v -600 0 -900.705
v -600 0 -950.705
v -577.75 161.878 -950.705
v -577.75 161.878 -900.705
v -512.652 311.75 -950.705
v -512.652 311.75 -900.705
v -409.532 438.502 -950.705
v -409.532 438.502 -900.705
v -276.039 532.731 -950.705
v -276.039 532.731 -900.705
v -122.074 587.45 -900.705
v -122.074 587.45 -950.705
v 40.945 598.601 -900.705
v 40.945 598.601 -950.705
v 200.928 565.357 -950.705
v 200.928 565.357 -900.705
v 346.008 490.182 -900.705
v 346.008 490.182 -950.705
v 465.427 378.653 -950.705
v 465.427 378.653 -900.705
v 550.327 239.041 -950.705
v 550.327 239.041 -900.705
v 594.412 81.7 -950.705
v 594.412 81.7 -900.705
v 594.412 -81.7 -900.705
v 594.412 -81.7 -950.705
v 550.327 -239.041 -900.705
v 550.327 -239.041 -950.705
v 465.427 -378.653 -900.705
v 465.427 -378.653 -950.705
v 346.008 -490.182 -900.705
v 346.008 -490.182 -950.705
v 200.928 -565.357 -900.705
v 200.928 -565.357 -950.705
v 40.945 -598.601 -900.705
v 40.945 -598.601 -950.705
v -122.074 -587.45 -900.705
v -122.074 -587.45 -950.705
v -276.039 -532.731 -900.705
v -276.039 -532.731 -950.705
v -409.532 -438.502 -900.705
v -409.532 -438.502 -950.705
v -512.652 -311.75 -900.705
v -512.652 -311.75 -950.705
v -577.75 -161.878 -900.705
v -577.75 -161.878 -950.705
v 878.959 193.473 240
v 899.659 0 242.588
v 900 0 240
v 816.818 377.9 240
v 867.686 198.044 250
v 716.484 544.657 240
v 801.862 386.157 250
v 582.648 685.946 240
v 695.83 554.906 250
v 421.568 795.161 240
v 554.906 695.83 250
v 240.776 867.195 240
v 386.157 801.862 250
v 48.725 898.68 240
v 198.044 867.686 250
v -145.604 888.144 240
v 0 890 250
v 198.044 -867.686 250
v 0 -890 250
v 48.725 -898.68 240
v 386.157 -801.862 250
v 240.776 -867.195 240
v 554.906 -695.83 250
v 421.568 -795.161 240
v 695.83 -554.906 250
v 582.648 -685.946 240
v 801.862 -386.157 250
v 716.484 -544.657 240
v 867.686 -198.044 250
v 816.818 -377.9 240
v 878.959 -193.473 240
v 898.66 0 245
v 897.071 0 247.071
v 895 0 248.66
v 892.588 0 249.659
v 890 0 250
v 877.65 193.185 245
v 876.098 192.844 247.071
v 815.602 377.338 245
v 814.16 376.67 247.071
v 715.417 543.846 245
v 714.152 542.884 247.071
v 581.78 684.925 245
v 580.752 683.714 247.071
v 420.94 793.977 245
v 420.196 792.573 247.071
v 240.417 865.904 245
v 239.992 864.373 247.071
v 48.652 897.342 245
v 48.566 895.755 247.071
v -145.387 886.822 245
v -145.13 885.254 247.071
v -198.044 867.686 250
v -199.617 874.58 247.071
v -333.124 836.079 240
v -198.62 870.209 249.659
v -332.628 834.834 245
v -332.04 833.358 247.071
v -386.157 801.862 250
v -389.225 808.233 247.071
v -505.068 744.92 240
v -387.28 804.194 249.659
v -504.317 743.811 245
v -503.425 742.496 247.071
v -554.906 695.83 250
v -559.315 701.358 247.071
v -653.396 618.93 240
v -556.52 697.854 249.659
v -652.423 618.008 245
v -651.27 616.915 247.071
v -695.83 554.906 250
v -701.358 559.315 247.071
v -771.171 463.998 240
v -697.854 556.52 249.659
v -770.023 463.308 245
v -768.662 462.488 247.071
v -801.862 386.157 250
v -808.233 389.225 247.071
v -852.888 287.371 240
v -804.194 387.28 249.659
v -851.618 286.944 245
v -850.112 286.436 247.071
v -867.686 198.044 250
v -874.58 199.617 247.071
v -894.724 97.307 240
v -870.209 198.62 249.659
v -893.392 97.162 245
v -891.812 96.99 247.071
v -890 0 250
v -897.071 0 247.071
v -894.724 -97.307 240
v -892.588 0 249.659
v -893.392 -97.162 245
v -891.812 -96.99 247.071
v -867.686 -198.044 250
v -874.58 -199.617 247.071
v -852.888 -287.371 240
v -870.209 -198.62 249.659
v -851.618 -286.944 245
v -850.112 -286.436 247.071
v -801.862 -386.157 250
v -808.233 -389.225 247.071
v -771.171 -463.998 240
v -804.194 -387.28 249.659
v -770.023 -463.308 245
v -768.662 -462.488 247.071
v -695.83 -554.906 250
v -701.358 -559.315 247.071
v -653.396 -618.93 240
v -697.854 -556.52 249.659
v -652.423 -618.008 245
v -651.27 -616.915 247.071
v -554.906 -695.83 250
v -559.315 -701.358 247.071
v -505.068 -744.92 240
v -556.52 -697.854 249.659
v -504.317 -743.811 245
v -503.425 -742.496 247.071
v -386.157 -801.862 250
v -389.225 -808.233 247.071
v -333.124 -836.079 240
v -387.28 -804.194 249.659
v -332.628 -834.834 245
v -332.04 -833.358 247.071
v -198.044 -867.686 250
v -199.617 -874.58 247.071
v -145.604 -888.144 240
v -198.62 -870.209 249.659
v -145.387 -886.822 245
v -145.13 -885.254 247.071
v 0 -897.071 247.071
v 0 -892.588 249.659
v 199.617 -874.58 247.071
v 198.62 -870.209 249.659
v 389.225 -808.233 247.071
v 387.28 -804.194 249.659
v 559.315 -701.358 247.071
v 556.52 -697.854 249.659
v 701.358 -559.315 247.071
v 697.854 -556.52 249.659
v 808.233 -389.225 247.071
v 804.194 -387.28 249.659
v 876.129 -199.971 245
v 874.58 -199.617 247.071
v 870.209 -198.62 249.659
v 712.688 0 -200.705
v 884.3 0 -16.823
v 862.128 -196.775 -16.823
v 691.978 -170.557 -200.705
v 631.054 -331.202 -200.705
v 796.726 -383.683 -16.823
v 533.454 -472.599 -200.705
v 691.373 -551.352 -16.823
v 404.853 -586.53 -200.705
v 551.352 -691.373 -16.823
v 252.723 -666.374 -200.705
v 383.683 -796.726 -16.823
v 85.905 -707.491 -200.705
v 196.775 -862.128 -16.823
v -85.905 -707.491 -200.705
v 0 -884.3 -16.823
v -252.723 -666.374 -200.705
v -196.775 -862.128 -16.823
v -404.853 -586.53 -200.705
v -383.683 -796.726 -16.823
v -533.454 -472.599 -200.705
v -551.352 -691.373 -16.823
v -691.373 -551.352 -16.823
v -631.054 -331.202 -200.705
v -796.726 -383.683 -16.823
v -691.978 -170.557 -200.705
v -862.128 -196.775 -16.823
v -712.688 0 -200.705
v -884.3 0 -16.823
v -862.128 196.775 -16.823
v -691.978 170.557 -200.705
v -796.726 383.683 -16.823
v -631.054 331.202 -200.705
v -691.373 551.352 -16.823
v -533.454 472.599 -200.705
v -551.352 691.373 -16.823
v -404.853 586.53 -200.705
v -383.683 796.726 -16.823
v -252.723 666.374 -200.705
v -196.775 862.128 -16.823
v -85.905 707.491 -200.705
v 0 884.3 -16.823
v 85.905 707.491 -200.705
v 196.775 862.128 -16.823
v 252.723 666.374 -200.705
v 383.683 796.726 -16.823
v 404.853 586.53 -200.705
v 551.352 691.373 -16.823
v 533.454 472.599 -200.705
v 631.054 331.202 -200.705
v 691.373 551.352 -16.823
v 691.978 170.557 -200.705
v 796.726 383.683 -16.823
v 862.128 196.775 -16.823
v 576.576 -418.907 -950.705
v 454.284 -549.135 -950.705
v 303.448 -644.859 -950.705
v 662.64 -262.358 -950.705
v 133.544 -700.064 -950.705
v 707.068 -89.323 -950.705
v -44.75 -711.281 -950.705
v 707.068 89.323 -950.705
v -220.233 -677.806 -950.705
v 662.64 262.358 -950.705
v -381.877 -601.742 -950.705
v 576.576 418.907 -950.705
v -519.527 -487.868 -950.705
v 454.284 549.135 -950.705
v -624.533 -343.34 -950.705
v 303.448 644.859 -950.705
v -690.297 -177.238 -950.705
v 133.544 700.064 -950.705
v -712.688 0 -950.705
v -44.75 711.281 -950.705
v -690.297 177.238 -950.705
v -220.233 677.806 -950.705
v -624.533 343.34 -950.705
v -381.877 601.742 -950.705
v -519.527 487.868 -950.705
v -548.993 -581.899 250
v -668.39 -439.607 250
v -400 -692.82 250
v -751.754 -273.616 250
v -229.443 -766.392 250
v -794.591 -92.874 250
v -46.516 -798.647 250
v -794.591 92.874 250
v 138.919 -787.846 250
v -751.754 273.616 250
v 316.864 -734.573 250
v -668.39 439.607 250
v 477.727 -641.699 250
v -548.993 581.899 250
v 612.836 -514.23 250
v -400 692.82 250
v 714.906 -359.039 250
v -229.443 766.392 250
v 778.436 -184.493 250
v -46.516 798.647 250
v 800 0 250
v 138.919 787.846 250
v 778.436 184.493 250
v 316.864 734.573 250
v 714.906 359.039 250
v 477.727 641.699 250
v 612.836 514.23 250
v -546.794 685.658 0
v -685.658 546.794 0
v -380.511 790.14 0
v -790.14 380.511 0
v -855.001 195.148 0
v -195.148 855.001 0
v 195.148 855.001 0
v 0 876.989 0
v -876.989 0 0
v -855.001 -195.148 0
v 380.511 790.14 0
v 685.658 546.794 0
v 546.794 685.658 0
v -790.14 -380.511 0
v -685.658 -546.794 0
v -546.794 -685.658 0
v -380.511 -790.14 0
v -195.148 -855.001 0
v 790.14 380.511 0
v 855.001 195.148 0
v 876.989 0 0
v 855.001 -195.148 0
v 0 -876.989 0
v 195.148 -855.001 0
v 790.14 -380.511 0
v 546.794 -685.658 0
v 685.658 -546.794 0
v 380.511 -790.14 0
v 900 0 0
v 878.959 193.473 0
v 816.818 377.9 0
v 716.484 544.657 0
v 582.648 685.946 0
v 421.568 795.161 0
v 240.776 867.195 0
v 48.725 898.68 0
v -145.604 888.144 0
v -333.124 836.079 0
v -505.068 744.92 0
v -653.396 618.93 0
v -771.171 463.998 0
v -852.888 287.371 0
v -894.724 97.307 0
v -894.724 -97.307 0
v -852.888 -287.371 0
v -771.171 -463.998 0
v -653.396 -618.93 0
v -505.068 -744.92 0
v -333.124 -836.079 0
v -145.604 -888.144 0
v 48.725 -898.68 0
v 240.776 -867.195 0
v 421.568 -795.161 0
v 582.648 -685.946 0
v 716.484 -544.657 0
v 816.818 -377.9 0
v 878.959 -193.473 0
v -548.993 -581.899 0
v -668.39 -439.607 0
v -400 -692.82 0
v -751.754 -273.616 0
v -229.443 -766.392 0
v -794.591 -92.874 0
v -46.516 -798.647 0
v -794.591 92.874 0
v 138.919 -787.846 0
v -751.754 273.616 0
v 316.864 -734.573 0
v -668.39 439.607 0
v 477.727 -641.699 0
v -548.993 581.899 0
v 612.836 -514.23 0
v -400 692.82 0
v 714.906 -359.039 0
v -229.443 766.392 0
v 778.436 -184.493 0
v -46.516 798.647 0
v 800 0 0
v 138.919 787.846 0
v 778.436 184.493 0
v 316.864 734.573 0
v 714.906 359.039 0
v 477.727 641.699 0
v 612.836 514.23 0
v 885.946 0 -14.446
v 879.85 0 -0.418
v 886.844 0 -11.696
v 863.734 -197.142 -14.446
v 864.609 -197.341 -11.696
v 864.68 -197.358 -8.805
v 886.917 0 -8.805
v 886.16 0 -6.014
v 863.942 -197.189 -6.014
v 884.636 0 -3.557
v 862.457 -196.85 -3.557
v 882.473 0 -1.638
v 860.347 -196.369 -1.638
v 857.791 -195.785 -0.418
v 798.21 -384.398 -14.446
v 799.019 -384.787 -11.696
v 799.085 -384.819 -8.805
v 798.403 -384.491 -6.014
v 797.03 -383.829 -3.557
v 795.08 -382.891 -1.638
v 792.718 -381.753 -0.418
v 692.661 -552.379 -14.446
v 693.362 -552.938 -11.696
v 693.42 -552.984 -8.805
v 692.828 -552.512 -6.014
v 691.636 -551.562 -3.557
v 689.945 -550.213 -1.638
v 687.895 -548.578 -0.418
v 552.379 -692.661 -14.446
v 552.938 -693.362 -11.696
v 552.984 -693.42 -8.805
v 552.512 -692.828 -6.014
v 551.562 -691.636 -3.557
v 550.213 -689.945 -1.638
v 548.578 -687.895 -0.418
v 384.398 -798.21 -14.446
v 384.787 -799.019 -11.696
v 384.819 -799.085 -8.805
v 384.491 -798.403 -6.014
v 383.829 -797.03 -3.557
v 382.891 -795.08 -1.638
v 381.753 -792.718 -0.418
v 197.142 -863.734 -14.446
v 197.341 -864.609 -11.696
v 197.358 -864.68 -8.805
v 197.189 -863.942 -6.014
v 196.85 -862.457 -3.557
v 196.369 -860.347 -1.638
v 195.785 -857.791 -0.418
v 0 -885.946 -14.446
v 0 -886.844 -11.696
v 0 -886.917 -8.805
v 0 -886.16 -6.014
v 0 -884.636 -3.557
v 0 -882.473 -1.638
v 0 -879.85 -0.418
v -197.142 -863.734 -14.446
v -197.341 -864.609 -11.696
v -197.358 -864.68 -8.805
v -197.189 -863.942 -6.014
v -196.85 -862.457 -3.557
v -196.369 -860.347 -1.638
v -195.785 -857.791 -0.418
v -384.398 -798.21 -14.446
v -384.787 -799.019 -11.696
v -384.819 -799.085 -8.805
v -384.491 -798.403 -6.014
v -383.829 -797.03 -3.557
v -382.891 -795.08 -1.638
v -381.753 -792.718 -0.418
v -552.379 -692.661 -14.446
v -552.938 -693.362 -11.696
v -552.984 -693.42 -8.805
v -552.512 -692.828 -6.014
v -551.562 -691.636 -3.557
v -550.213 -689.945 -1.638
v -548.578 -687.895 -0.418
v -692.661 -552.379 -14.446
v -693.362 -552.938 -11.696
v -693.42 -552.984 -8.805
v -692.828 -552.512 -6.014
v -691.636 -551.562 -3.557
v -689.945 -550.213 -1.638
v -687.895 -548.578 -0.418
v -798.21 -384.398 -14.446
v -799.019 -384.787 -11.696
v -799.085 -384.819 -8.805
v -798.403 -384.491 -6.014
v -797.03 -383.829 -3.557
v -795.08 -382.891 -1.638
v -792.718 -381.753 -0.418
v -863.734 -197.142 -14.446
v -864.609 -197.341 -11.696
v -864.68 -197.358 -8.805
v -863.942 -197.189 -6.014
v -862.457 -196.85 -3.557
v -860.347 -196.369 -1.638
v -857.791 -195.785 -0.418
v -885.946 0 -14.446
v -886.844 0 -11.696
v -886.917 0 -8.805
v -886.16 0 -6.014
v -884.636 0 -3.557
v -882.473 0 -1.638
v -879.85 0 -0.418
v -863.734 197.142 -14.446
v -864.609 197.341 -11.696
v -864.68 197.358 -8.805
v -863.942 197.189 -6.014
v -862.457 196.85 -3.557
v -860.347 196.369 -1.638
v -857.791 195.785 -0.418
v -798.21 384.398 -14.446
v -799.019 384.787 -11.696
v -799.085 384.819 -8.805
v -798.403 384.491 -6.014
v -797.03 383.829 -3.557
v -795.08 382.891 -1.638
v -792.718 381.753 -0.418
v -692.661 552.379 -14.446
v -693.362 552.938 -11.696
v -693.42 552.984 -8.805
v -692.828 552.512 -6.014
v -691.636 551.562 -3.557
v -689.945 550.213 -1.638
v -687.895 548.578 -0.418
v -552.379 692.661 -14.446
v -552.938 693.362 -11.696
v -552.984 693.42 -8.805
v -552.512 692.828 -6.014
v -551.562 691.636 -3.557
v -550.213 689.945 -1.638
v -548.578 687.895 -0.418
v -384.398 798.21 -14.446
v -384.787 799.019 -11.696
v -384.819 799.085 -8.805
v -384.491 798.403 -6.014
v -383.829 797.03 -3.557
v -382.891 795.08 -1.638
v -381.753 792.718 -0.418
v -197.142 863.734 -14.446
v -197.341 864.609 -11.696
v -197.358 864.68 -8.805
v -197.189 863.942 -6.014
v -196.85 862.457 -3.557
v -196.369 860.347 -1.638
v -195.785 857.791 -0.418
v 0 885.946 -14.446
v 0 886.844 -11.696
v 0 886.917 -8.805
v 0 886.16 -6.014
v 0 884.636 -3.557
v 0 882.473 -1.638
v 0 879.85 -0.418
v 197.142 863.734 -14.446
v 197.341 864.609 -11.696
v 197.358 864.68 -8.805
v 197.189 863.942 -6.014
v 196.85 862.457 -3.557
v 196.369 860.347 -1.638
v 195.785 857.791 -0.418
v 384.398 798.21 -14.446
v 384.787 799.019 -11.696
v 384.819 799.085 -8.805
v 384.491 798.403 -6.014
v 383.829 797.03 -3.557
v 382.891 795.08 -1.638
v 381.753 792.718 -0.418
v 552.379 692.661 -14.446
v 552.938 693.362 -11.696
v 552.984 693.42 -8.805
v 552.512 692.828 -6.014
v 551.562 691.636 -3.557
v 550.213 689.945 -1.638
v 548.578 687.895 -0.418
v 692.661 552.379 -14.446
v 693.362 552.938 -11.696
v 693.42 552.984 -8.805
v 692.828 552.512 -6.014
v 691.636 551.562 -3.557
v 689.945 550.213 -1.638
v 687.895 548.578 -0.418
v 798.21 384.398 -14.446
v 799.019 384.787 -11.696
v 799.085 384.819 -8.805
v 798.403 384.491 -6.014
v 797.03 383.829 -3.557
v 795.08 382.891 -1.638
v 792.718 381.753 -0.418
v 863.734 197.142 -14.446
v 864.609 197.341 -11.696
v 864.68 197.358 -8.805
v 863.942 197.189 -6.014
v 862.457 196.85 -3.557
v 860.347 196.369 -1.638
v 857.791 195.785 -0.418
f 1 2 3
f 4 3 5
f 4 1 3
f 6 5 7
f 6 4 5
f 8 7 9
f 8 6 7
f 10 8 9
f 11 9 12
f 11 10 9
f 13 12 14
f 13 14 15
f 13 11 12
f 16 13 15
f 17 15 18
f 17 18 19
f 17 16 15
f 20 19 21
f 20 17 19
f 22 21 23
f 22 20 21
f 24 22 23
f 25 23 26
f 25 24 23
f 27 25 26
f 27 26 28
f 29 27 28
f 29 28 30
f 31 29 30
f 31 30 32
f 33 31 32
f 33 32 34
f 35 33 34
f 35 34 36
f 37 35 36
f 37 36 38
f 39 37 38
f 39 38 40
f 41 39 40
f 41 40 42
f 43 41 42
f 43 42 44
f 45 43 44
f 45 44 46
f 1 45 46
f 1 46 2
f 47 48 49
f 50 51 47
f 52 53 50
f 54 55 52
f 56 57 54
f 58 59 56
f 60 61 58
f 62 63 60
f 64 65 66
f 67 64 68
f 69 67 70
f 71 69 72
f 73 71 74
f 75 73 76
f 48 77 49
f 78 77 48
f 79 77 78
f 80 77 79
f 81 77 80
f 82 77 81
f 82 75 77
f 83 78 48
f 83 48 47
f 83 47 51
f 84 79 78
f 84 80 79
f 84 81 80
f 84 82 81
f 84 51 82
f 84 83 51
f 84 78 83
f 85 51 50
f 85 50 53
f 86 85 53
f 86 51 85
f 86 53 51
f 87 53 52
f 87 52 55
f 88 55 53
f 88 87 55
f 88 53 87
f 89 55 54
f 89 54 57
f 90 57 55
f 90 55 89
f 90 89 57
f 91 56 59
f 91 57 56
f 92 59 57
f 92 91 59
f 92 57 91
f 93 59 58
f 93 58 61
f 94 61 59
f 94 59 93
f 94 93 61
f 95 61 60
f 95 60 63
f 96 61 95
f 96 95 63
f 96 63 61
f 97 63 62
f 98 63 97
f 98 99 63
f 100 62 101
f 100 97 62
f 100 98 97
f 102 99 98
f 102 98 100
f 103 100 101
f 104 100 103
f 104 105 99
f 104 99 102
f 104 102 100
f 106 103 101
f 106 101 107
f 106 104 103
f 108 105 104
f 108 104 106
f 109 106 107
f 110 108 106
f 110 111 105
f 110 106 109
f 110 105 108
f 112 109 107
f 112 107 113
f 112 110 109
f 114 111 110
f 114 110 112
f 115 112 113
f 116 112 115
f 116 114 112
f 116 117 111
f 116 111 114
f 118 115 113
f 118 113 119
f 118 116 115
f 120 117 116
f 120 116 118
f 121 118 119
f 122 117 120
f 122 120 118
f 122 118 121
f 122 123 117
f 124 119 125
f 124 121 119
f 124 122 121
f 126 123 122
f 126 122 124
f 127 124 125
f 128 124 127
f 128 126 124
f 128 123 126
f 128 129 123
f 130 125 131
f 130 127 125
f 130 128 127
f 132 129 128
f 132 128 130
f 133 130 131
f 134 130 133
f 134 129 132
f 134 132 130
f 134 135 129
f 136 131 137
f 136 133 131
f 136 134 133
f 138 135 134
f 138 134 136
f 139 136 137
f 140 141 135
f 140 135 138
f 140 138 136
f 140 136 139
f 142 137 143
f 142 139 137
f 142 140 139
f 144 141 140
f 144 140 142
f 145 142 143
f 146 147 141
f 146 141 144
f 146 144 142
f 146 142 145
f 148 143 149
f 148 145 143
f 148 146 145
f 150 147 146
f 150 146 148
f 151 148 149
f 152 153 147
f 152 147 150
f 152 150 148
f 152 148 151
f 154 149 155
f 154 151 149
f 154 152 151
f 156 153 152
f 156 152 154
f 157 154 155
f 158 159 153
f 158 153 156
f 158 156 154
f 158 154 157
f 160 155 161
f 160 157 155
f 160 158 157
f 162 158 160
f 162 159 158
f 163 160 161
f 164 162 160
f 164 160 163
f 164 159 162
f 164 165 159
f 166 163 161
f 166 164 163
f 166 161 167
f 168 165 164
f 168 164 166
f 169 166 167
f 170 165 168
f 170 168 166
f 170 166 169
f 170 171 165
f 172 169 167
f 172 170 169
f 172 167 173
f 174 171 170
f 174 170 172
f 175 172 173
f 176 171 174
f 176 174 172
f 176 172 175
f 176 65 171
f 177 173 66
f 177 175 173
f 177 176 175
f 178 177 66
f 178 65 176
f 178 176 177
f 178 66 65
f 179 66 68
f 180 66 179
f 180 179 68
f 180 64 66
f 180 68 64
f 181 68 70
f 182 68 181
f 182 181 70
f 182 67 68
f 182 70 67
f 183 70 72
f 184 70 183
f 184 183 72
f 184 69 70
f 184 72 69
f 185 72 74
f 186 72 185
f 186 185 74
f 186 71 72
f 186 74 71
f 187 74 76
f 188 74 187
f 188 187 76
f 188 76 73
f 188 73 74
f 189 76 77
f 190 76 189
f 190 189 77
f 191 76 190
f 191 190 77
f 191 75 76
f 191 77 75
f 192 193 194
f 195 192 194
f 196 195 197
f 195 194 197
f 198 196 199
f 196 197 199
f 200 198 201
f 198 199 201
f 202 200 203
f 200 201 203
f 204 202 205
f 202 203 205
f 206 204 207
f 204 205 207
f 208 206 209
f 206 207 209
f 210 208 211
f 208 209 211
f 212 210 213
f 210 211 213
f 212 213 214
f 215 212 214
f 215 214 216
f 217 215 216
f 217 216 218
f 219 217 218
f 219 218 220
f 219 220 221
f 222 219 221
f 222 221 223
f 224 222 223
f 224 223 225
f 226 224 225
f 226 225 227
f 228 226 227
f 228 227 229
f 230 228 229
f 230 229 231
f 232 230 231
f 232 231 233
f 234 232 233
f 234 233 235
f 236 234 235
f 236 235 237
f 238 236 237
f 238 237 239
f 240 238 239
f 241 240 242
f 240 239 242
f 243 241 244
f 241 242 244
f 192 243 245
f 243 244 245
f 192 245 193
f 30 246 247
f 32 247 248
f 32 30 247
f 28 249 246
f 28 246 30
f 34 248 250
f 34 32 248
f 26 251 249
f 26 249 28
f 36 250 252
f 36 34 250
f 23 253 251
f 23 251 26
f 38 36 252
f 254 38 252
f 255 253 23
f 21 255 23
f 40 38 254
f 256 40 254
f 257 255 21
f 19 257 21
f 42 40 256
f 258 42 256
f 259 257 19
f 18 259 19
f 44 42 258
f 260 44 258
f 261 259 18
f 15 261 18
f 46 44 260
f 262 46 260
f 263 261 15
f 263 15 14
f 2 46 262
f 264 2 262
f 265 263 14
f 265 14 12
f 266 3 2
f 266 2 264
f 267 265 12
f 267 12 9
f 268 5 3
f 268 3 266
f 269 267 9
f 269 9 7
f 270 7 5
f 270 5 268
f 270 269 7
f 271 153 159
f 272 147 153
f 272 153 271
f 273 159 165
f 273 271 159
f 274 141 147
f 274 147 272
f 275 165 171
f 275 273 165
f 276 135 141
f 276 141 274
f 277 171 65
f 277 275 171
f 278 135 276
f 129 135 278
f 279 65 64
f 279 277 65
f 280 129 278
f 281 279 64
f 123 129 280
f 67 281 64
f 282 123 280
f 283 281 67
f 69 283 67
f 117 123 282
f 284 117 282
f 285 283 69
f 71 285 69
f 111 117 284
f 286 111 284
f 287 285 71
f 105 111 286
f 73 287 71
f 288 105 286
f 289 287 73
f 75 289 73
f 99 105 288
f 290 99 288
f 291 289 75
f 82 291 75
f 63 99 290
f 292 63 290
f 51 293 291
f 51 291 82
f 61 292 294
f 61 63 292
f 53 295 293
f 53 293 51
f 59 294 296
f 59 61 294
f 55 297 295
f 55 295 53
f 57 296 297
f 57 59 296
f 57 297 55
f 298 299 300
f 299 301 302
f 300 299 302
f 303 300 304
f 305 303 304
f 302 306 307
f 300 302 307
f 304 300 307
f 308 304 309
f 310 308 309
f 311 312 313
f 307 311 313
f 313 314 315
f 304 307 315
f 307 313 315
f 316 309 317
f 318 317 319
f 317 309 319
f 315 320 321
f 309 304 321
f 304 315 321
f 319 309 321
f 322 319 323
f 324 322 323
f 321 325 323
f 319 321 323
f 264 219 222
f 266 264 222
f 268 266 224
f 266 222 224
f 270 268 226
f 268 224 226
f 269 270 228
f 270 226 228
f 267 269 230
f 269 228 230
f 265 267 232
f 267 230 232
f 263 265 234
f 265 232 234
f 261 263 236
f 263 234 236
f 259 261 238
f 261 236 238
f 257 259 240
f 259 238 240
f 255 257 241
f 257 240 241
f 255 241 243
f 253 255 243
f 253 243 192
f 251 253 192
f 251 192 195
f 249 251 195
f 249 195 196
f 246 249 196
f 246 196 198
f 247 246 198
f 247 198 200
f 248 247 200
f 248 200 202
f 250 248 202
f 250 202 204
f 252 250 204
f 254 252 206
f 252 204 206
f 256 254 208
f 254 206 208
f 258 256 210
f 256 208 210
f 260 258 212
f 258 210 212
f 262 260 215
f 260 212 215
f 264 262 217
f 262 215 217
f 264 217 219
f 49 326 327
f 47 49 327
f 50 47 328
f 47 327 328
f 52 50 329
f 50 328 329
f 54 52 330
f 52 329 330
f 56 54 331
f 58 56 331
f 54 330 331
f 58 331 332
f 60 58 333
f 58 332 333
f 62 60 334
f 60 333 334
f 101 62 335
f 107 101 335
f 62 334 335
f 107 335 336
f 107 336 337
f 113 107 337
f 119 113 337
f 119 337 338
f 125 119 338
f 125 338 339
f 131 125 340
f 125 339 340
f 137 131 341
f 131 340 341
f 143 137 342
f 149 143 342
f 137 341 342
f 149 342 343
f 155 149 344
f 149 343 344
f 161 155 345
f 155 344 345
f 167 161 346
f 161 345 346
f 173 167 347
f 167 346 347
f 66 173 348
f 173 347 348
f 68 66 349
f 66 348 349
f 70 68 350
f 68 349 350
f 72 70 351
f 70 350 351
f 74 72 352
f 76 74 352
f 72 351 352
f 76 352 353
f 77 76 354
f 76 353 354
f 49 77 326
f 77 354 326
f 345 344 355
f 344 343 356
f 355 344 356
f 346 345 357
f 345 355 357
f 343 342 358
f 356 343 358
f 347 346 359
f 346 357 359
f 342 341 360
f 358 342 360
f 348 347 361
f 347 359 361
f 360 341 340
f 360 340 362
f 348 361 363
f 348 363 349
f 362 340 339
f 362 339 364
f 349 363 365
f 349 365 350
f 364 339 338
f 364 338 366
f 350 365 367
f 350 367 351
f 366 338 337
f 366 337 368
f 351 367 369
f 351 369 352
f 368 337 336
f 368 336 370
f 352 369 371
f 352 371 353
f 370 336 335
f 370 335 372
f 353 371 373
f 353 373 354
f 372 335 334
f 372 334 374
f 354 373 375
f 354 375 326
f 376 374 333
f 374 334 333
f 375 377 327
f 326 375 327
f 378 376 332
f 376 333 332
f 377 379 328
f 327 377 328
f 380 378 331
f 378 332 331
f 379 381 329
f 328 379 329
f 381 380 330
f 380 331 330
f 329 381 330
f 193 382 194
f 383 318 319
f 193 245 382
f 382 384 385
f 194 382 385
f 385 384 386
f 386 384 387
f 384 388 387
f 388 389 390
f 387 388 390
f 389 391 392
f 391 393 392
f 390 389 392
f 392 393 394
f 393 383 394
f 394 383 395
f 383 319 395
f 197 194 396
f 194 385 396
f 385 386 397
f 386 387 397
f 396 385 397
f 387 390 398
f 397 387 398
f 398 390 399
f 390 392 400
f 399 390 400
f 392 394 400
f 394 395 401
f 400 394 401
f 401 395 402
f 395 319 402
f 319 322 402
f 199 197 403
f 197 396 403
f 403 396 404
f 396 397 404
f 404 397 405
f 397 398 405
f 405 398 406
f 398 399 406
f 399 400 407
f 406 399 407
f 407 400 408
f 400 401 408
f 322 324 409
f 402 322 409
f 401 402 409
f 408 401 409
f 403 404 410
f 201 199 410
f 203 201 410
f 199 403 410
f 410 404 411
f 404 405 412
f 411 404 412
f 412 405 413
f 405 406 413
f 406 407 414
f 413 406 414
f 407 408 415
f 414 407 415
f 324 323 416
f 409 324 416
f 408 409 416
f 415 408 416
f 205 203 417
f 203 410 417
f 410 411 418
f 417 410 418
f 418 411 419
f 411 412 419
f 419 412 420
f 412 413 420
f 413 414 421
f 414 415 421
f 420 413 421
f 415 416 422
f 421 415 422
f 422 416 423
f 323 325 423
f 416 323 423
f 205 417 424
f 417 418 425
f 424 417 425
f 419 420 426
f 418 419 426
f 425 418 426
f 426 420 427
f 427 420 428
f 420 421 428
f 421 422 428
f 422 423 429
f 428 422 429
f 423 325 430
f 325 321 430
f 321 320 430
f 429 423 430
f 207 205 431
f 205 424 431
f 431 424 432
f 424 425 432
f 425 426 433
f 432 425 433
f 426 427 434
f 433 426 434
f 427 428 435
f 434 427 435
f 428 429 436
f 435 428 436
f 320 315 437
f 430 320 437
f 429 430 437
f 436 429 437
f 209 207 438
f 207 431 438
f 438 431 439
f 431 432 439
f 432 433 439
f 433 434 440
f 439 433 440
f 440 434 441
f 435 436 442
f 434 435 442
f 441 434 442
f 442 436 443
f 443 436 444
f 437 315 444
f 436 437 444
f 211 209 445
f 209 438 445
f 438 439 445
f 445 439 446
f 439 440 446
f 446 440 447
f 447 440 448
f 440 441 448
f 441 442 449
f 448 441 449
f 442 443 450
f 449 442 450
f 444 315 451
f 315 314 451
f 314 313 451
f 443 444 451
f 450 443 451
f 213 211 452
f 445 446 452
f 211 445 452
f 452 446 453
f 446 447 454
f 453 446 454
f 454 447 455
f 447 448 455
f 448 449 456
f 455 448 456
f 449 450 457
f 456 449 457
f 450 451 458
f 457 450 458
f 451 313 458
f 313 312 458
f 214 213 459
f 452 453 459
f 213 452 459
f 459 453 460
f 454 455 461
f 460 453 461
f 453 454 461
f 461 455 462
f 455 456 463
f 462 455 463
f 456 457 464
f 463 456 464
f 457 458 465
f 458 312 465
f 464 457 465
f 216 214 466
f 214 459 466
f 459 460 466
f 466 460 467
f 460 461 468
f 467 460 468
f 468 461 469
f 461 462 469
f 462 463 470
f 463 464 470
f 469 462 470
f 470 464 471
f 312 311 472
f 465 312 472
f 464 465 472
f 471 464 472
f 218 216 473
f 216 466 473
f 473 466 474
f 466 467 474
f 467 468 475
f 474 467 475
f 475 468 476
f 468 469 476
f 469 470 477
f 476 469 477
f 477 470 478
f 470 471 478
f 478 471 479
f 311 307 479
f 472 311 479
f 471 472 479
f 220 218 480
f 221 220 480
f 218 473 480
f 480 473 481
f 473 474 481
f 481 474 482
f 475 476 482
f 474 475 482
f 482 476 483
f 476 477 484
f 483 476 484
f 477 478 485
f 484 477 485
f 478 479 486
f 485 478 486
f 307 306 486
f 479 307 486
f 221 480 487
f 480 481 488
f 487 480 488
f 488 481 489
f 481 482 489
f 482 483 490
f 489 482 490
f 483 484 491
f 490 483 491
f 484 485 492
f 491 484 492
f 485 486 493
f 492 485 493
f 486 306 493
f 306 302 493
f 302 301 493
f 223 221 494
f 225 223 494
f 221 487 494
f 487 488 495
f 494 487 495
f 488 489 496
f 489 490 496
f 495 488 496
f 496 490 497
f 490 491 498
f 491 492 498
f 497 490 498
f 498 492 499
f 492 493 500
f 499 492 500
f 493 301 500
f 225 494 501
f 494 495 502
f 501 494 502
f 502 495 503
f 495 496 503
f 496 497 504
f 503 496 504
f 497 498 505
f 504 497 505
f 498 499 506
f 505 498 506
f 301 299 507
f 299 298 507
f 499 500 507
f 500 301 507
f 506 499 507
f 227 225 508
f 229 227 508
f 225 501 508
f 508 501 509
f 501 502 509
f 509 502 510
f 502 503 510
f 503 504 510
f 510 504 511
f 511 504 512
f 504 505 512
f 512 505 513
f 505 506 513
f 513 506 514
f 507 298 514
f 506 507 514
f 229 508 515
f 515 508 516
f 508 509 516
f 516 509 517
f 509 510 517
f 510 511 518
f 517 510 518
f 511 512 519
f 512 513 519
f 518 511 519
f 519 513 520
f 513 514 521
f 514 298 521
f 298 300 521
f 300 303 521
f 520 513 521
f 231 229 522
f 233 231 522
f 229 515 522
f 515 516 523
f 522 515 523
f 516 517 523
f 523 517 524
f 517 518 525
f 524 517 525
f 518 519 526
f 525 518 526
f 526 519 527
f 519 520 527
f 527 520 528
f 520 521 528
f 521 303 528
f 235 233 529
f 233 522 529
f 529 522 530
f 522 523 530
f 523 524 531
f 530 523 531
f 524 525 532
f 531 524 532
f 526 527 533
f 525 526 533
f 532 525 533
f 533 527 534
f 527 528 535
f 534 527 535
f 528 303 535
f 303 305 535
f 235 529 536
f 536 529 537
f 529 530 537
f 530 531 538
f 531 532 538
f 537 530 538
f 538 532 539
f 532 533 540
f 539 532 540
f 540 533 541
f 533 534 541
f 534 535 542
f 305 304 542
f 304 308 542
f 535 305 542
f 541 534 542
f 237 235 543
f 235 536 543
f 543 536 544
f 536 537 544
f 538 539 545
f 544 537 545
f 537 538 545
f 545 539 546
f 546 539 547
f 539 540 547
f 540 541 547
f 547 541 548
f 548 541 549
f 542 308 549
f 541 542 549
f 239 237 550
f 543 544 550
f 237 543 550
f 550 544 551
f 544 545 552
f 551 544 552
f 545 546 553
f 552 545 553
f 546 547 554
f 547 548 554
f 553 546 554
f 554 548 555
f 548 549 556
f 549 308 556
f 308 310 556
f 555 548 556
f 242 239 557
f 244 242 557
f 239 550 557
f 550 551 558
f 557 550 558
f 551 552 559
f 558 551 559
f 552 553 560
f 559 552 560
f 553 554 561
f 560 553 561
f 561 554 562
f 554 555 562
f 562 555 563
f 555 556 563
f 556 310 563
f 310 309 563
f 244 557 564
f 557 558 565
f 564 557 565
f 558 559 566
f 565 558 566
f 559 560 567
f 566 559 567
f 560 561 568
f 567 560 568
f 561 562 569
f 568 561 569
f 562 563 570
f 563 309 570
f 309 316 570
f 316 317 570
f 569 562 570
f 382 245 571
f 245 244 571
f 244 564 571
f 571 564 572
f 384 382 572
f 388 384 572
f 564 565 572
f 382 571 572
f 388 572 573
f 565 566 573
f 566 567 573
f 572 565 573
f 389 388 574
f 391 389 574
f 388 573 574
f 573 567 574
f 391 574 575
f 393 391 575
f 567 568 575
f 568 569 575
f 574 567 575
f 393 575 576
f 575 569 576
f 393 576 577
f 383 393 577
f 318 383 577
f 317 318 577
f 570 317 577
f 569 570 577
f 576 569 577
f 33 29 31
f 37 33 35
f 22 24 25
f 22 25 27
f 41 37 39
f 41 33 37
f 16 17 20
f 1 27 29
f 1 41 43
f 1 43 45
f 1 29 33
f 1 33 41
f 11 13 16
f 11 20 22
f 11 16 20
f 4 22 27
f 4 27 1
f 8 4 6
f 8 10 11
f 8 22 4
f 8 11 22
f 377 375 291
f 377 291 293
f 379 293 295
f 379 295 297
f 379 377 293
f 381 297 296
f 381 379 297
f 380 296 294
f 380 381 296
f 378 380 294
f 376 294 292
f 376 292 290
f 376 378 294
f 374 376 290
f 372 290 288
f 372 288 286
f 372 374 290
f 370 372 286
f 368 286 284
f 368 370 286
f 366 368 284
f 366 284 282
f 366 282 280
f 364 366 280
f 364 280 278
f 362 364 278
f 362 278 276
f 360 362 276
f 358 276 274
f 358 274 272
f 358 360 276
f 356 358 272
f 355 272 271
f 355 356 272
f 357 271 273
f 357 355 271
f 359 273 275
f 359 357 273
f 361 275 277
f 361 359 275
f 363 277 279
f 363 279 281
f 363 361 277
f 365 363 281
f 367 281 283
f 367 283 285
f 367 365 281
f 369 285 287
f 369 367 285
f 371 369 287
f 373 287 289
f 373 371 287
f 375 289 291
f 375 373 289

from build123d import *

# Parameters (mm, degrees)
SKETCH2_R           = 900
SKETCH2_R_2         = 800
BOSS_EXTRUDE1_DEPTH = 250
FILLET2_R           = 10
FILLET3_R           = 10
SKETCH4_R           = 712.687606949
SKETCH4_R_2         = 600
BOSS_EXTRUDE2_DEPTH = 750
SKETCH5_R           = 600
BOSS_EXTRUDE3_DEPTH = 700


with BuildPart() as part:
    # Sketch2 → Boss-Extrude1 (new body)
    with BuildSketch(Plane.XY):
        Circle(SKETCH2_R)
        Circle(SKETCH2_R_2, mode=Mode.SUBTRACT)
    extrude(amount=BOSS_EXTRUDE1_DEPTH)

    # Fillet2
    fillet2_edges = [part.edges().sort_by_distance(p)[0] for p in [
        (-900, 0, 250),
    ]]
    fillet(fillet2_edges, radius=FILLET2_R)


with BuildPart() as body_2:
    # Sketch3 → Revolve1 (revolve)
    with BuildSketch(Plane(origin=(0, 0, 0), x_dir=(0, 0, -1), z_dir=(1, 0, 0)), mode=Mode.PRIVATE) as revolve1_sk:
        Polygon((0, 0), (200.705378627, 0), (200.705378627, -712.687606949), (0, -900), align=None)
    revolve(revolve1_sk.sketch.rotate(Axis((0, 0, 0), (0, 0, -1)), 270), axis=Axis((0, 0, 0), (0, 0, -1)))

    # Fillet3
    fillet3_edges = [body_2.edges().sort_by_distance(p)[0] for p in [
        (-900, 0, 0),
    ]]
    fillet(fillet3_edges, radius=FILLET3_R)

    # Sketch4 → Boss-Extrude2 (add)
    with BuildSketch(Plane(origin=(0, 0, -200.705378627), x_dir=(-1, 0, 0), z_dir=(0, 0, -1))):
        Circle(SKETCH4_R)
        Circle(SKETCH4_R_2, mode=Mode.SUBTRACT)
    extrude(amount=BOSS_EXTRUDE2_DEPTH)

    # Sketch5 → Boss-Extrude3 (add)
    with BuildSketch(Plane(origin=(0, 0, -200.705378627), x_dir=(-1, 0, 0), z_dir=(0, 0, -1))):
        Circle(SKETCH5_R)
    extrude(amount=BOSS_EXTRUDE3_DEPTH)


solid = Compound([part.part, body_2.part])
